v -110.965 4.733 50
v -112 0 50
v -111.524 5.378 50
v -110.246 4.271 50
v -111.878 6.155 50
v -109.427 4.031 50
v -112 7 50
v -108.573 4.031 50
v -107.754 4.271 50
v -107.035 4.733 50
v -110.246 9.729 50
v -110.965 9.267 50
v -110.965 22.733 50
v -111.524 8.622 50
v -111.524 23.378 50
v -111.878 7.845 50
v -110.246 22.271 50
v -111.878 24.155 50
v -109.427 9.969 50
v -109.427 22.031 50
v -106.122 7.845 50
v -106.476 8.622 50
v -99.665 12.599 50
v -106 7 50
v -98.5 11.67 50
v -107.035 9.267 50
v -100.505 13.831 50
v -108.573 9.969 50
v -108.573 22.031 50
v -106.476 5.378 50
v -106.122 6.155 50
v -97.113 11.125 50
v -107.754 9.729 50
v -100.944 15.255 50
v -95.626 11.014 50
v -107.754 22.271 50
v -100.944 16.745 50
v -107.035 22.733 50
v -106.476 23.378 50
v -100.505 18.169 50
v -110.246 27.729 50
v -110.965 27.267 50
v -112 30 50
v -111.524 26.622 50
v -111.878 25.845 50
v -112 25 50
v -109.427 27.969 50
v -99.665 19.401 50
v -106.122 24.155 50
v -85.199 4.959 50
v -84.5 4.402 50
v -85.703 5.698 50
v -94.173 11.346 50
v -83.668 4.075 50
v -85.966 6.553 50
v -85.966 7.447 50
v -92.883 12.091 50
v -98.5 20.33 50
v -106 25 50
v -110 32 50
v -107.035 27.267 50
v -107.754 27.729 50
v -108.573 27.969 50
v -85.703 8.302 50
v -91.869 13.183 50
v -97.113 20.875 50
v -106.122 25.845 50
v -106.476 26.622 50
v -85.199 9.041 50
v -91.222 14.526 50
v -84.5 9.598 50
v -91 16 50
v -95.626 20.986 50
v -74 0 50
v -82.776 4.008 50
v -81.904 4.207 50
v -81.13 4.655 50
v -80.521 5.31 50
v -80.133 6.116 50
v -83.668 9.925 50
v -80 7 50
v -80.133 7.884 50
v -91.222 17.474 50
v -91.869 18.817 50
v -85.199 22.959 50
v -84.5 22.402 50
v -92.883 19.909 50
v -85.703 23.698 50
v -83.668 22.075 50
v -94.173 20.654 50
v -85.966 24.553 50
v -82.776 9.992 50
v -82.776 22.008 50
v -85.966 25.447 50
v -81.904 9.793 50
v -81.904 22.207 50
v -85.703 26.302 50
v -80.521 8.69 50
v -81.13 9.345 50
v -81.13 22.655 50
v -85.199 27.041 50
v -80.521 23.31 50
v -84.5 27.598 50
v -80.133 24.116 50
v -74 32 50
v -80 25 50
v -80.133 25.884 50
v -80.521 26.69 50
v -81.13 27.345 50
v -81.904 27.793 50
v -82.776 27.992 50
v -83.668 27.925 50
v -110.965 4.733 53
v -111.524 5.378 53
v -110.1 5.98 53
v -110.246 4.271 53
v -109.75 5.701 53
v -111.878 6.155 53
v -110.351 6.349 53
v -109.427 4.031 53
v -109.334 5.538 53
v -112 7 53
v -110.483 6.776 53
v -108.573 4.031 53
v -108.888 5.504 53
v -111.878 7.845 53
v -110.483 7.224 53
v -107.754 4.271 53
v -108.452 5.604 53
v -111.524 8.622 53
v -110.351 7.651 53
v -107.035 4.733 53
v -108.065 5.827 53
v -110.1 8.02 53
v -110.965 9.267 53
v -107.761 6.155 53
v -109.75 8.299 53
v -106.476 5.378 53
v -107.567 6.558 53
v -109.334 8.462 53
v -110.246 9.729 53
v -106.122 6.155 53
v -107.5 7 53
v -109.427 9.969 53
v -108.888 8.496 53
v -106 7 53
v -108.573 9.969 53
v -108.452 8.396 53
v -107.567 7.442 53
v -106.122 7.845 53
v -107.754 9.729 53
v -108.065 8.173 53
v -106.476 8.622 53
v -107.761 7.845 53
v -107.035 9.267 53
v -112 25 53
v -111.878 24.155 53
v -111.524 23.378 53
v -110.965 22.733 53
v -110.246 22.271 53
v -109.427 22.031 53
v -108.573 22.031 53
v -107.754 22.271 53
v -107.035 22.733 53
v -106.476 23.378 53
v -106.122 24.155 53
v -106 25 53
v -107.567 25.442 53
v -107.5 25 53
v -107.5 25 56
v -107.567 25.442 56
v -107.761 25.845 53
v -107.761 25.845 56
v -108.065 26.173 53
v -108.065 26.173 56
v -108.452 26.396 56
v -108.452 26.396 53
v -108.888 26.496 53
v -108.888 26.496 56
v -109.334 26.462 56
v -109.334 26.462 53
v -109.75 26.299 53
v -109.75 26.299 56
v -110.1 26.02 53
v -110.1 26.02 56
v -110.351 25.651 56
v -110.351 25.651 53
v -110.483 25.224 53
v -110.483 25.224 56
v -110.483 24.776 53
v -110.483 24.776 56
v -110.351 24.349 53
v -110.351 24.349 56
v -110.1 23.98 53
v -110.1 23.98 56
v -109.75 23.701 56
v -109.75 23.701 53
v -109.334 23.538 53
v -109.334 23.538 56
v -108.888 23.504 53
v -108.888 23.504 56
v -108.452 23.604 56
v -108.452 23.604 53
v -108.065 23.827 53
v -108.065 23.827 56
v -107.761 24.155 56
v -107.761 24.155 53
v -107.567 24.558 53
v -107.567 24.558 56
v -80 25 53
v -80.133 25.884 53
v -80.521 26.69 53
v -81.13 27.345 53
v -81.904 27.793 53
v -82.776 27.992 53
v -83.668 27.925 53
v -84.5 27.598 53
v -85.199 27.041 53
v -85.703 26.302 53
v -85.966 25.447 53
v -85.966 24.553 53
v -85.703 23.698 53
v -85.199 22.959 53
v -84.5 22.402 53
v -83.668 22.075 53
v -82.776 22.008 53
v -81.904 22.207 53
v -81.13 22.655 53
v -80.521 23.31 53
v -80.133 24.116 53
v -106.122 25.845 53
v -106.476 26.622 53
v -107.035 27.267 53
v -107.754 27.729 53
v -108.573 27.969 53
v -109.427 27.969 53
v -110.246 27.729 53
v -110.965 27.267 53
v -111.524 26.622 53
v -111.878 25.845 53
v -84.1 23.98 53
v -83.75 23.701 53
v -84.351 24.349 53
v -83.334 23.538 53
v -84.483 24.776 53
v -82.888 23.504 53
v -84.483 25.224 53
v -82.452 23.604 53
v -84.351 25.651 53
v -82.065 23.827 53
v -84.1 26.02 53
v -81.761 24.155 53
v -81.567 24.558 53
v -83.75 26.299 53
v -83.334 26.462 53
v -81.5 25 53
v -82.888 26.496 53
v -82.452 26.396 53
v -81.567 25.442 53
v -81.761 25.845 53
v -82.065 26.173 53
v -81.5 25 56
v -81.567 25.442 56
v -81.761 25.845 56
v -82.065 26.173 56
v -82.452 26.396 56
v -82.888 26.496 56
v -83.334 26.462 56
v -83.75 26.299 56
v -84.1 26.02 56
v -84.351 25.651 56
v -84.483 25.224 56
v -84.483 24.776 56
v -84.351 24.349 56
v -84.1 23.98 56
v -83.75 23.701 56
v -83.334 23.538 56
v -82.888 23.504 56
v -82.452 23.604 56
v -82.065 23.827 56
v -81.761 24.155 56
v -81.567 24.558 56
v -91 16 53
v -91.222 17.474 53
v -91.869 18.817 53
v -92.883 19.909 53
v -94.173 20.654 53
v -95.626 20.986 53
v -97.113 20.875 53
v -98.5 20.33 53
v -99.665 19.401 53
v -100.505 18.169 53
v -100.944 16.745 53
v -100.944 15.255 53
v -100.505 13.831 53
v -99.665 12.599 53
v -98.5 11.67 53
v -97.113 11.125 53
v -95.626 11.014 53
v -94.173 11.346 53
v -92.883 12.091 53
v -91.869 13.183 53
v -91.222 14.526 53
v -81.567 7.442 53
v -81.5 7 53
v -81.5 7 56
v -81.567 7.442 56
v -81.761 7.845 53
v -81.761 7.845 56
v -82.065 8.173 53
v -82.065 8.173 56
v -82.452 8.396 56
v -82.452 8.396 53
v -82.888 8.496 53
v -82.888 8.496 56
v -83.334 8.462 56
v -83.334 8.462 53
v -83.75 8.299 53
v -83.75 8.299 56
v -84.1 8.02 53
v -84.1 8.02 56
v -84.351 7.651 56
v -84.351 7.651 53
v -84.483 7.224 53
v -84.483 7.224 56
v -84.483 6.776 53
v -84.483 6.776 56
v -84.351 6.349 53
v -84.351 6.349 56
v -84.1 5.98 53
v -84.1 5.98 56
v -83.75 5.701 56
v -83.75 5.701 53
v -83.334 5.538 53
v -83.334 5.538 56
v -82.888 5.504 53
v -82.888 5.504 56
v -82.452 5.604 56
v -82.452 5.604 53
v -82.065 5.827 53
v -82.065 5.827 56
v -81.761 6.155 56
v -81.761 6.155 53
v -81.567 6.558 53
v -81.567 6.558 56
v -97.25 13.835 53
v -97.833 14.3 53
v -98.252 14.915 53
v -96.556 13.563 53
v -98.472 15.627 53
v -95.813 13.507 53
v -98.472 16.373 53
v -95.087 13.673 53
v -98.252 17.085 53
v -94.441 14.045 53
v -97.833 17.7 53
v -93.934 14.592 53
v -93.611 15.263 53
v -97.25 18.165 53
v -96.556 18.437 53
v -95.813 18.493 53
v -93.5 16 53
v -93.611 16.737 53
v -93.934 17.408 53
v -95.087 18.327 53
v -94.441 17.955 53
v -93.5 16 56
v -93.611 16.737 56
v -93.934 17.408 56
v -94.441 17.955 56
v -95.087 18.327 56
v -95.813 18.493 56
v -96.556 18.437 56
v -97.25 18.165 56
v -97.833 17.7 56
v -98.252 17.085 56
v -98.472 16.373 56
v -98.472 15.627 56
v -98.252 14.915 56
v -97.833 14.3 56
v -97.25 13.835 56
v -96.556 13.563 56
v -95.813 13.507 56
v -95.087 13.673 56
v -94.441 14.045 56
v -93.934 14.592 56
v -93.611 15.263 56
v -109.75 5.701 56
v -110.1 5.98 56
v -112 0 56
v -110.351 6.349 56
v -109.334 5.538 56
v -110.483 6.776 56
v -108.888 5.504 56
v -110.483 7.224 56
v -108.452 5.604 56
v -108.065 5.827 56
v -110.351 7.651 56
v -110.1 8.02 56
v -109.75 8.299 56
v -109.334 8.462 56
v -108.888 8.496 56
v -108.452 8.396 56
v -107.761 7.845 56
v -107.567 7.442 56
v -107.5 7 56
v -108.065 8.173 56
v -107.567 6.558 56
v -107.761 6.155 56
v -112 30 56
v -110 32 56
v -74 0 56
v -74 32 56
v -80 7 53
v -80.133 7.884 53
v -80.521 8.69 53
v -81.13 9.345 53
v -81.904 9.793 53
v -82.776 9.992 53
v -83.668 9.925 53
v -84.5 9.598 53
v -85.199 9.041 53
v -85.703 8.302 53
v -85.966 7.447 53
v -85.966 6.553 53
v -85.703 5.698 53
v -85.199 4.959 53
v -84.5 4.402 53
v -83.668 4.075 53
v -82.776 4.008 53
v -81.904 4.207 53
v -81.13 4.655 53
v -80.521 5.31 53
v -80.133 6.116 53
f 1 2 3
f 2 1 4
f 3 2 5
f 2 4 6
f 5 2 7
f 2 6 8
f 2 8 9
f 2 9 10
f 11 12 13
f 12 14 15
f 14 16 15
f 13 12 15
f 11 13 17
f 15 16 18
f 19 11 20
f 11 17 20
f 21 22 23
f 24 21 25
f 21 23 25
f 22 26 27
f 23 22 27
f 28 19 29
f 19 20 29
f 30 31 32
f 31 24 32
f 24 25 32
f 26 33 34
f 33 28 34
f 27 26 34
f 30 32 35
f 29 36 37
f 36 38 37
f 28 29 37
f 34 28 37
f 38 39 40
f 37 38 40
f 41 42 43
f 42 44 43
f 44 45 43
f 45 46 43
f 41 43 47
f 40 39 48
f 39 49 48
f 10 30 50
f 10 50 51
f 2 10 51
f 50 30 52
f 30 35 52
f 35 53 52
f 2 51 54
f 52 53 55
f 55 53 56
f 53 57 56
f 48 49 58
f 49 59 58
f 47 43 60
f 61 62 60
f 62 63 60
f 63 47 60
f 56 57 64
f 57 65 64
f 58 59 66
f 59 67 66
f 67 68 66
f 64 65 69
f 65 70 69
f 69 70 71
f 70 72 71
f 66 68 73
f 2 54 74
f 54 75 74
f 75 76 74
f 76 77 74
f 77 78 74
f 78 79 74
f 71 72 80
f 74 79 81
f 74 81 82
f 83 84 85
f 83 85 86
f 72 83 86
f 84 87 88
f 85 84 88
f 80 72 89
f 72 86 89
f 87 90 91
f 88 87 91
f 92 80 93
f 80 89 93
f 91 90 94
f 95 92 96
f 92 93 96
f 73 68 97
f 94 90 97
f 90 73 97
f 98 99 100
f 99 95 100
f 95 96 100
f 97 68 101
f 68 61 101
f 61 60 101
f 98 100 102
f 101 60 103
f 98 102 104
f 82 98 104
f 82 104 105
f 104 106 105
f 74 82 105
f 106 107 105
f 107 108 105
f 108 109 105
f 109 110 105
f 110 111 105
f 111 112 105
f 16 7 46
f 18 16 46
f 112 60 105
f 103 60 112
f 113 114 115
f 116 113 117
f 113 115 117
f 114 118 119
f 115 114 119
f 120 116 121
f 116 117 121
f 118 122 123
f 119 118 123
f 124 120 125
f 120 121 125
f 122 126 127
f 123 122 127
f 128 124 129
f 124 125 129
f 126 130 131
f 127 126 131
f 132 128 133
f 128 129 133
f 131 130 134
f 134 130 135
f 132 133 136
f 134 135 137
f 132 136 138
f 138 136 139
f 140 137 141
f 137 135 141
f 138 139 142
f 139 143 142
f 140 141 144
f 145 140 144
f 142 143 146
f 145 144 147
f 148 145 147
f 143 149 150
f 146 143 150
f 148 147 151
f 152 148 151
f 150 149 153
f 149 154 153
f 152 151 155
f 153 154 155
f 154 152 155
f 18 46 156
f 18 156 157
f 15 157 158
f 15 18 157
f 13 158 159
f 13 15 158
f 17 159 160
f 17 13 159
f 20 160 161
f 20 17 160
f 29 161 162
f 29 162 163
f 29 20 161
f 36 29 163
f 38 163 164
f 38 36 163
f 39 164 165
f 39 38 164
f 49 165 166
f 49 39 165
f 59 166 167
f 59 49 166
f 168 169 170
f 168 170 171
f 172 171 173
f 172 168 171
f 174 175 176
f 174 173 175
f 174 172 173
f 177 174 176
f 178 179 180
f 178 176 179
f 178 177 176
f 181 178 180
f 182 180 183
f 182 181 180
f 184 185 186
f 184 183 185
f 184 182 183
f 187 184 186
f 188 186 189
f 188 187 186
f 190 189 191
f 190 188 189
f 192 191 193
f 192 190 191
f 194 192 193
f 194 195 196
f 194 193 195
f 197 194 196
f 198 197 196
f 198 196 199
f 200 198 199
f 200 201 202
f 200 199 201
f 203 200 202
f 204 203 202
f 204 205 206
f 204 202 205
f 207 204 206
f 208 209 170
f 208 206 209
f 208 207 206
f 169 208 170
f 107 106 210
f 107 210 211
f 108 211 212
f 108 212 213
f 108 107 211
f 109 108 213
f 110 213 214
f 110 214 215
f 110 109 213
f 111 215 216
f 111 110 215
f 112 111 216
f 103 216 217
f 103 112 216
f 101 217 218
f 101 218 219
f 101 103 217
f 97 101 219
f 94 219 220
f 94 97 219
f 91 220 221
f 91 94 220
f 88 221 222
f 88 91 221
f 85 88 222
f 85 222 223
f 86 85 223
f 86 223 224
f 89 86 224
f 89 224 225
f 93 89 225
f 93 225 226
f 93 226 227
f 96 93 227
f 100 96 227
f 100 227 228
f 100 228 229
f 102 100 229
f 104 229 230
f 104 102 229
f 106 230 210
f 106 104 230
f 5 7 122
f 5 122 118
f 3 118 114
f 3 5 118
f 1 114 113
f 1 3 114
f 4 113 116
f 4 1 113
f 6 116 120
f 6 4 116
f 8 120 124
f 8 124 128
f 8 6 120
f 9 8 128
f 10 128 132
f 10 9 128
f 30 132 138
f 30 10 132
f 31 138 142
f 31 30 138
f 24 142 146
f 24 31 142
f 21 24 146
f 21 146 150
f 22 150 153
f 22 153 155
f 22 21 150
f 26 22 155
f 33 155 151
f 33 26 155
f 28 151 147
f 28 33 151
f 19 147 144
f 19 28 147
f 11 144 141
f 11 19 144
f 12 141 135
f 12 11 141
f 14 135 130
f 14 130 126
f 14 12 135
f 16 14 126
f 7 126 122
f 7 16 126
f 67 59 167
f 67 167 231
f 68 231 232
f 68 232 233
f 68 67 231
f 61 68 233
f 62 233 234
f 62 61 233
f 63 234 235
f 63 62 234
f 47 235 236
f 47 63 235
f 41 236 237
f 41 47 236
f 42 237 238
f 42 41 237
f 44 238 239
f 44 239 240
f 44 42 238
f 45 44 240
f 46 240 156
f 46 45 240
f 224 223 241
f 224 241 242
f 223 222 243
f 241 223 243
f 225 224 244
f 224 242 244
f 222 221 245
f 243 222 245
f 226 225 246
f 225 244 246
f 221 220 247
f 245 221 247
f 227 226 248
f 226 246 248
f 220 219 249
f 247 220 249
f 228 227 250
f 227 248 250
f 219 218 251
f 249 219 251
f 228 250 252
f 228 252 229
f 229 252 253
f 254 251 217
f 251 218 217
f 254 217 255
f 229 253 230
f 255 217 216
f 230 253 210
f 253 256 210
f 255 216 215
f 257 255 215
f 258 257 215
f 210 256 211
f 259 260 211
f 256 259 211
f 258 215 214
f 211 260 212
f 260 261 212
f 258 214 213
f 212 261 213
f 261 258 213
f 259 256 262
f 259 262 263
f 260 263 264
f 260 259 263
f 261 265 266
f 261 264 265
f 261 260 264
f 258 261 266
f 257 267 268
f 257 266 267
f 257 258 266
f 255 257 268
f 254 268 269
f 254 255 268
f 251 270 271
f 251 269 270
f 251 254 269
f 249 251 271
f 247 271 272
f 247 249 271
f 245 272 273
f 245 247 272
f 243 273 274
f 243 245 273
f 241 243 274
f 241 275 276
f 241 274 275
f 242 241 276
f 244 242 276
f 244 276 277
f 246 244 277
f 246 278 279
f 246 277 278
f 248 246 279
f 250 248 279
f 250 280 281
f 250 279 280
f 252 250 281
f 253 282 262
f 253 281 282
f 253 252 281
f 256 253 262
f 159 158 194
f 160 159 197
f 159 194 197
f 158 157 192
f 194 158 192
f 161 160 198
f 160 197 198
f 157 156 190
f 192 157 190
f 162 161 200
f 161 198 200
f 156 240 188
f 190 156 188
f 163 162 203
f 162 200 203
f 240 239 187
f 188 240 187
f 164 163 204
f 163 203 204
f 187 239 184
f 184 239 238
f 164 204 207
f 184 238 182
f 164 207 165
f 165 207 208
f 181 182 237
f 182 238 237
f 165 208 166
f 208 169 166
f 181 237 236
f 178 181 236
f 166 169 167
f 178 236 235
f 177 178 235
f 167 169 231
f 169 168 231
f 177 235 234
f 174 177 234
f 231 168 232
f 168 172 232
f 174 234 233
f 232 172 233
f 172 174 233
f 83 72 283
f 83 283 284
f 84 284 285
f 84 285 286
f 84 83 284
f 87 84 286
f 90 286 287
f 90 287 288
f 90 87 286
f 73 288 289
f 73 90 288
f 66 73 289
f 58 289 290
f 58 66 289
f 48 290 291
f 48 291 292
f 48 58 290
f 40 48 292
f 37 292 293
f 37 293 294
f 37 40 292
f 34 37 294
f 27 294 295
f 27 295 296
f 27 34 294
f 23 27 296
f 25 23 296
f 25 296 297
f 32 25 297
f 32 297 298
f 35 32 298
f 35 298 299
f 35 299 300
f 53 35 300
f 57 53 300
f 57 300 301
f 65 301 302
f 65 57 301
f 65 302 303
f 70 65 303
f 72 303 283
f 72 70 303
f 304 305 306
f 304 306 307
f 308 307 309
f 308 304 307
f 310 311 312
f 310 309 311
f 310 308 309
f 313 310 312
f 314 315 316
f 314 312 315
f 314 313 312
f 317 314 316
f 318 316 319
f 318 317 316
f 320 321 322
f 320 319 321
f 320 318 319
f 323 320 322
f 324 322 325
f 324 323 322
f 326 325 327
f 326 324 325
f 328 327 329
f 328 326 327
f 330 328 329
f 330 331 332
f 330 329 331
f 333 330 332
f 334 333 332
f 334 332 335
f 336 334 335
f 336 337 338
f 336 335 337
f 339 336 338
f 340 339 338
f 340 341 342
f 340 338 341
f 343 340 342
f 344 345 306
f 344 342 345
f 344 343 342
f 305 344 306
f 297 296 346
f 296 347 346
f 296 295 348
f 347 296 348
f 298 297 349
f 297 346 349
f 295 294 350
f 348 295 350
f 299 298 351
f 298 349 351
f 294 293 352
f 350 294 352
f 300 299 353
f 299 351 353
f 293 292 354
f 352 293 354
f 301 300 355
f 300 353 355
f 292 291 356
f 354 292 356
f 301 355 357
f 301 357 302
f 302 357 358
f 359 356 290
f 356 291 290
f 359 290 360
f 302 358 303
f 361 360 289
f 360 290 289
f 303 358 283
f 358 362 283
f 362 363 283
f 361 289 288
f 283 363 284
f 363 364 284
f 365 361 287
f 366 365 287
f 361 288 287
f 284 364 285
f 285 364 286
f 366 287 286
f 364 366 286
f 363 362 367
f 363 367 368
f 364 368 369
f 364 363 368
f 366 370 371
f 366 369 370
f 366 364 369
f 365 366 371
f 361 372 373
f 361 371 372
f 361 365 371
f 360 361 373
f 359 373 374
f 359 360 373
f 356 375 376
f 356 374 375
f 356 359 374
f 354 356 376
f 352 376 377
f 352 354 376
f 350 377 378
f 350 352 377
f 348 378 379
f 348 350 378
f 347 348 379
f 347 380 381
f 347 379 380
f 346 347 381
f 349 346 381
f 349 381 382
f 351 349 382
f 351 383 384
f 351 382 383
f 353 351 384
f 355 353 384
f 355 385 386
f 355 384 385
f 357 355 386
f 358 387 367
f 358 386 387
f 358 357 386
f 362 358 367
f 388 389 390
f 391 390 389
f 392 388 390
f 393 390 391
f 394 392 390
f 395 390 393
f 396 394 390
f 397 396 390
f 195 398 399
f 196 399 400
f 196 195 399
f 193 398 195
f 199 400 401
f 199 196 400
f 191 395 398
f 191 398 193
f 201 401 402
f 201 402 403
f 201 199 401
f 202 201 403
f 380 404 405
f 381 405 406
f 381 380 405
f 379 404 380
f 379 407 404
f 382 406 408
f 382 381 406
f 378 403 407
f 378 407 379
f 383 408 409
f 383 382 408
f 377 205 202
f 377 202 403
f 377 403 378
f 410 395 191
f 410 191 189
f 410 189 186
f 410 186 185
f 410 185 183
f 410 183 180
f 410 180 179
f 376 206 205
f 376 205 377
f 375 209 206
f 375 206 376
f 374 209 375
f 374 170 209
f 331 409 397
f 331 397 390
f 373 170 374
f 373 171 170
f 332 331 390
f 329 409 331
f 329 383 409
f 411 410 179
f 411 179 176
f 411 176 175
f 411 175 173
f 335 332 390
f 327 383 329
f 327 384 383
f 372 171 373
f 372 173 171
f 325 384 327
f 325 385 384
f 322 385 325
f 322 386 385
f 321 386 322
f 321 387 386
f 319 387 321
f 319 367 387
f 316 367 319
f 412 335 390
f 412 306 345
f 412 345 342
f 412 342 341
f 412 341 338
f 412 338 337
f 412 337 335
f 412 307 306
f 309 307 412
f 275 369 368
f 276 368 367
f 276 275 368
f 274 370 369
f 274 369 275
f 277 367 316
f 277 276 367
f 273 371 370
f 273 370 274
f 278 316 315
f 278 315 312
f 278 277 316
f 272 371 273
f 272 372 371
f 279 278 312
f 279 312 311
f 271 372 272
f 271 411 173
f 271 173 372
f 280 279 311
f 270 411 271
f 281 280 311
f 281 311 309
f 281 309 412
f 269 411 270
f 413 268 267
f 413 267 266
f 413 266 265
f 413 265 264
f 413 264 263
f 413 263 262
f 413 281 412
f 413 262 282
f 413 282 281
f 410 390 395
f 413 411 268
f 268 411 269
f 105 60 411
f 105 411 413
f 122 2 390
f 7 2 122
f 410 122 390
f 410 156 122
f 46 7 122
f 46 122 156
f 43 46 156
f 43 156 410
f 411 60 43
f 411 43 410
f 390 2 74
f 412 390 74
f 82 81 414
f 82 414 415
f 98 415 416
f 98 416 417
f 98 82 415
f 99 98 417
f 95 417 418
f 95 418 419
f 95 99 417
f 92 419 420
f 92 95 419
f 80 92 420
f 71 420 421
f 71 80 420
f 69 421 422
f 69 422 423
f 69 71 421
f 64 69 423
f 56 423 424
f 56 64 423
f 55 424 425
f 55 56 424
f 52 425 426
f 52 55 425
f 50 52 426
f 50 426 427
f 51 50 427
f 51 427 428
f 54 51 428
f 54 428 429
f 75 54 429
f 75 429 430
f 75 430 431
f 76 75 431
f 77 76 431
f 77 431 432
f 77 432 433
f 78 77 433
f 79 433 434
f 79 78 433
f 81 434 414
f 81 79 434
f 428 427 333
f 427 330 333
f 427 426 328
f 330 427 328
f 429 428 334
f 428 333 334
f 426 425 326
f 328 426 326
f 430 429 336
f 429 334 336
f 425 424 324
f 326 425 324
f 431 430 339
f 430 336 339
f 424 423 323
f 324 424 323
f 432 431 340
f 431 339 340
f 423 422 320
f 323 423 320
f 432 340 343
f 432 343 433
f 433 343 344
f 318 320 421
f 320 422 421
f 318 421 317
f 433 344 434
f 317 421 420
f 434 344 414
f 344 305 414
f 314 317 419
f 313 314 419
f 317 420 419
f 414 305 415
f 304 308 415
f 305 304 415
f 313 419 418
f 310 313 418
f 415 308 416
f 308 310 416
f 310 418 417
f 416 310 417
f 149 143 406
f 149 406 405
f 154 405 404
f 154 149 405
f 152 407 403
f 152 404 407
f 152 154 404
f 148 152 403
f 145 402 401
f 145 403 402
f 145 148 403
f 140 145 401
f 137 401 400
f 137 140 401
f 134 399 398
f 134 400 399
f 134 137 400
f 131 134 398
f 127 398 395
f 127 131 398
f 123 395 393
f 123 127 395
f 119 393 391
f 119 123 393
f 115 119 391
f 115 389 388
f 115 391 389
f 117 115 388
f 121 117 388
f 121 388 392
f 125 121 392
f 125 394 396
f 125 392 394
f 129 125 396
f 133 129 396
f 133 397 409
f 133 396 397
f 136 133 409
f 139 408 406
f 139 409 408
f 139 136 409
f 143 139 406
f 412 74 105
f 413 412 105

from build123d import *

# Parameters (mm, degrees)
CYLINDER882_R     = 5
CYLINDER882_DEPTH = 3
CYLINDER891_R     = 2.5
CYLINDER891_DEPTH = 20
CYLINDER883_R     = 1.5
CYLINDER883_DEPTH = 20
CYLINDER885_R     = 1.5
CYLINDER885_DEPTH = 20
CYLINDER886_R     = 1.5
CYLINDER886_DEPTH = 20
CYLINDER884_R     = 1.5
CYLINDER884_DEPTH = 20
CYLINDER887_R     = 3
CYLINDER887_DEPTH = 3
CYLINDER888_R     = 3
CYLINDER888_DEPTH = 3
CYLINDER890_R     = 3
CYLINDER890_DEPTH = 3
CYLINDER889_R     = 3
CYLINDER889_DEPTH = 3
BOX422_W          = 38
BOX422_H          = 32
BOX422_DEPTH      = 6
CHAMFER001_SIZE   = 2


with BuildPart() as v_lec882:
    # Cylinder882 → Cylinder882 (new body)
    with BuildSketch(Plane(origin=(-96, 16, 50), x_dir=(1, 0, 0), z_dir=(0, 0, 1))):
        Circle(CYLINDER882_R)
    extrude(amount=CYLINDER882_DEPTH)


with BuildPart() as v_lec891:
    # Cylinder891 → Cylinder891 (new body)
    with BuildSketch(Plane(origin=(-96, 16, 50), x_dir=(1, 0, 0), z_dir=(0, 0, 1))):
        Circle(CYLINDER891_R)
    extrude(amount=CYLINDER891_DEPTH)


with BuildPart() as v_lec883:
    # Cylinder883 → Cylinder883 (new body)
    with BuildSketch(Plane(origin=(-83, 25, 54), x_dir=(1, 0, 0), z_dir=(0, 0, 1))):
        Circle(CYLINDER883_R)
    extrude(amount=CYLINDER883_DEPTH)


with BuildPart() as v_lec885:
    # Cylinder885 → Cylinder885 (new body)
    with BuildSketch(Plane(origin=(-109, 7, 54), x_dir=(1, 0, 0), z_dir=(0, 0, 1))):
        Circle(CYLINDER885_R)
    extrude(amount=CYLINDER885_DEPTH)


with BuildPart() as v_lec886:
    # Cylinder886 → Cylinder886 (new body)
    with BuildSketch(Plane(origin=(-109, 25, 54), x_dir=(1, 0, 0), z_dir=(0, 0, 1))):
        Circle(CYLINDER886_R)
    extrude(amount=CYLINDER886_DEPTH)


with BuildPart() as compound491:
    # Cylinder884 → Cylinder884 (new body)
    with BuildSketch(Plane(origin=(-83, 7, 54), x_dir=(1, 0, 0), z_dir=(0, 0, 1))):
        Circle(CYLINDER884_R)
    extrude(amount=CYLINDER884_DEPTH)

    # Compound491: union Válec883, Válec885, Válec886
    add(v_lec883.part)
    add(v_lec885.part)
    add(v_lec886.part)


with BuildPart() as compound491_1:
    # Compound491 placement: moved
    add(compound491.part.moved(Location((0, 0, -4))))


with BuildPart() as v_lec887:
    # Cylinder887 → Cylinder887 (new body)
    with BuildSketch(Plane(origin=(-83, 25, 54), x_dir=(1, 0, 0), z_dir=(0, 0, 1))):
        Circle(CYLINDER887_R)
    extrude(amount=CYLINDER887_DEPTH)


with BuildPart() as v_lec888:
    # Cylinder888 → Cylinder888 (new body)
    with BuildSketch(Plane(origin=(-109, 7, 54), x_dir=(1, 0, 0), z_dir=(0, 0, 1))):
        Circle(CYLINDER888_R)
    extrude(amount=CYLINDER888_DEPTH)


with BuildPart() as v_lec890:
    # Cylinder890 → Cylinder890 (new body)
    with BuildSketch(Plane(origin=(-109, 25, 54), x_dir=(1, 0, 0), z_dir=(0, 0, 1))):
        Circle(CYLINDER890_R)
    extrude(amount=CYLINDER890_DEPTH)


with BuildPart() as compound492:
    # Cylinder889 → Cylinder889 (new body)
    with BuildSketch(Plane(origin=(-83, 7, 54), x_dir=(1, 0, 0), z_dir=(0, 0, 1))):
        Circle(CYLINDER889_R)
    extrude(amount=CYLINDER889_DEPTH)

    # Compound492: union Válec887, Válec888, Válec890
    add(v_lec887.part)
    add(v_lec888.part)
    add(v_lec890.part)


with BuildPart() as compound492_1:
    # Compound492 placement: moved
    add(compound492.part.moved(Location((0, 0, -4))))


with BuildPart() as base_stabil_cover_left:
    # Box422 → Box422 (new body)
    with BuildSketch(Plane(origin=(-112, 0, 50), x_dir=(1, 0, 0), z_dir=(0, 0, 1))):
        with Locations((19, 16)):
            Rectangle(BOX422_W, BOX422_H)
    extrude(amount=BOX422_DEPTH)

    # Cut394: cut Compound492
    add(compound492_1.part, mode=Mode.SUBTRACT)

    # Cut395: cut Compound491
    add(compound491_1.part, mode=Mode.SUBTRACT)

    # Cut396: cut Válec891
    add(v_lec891.part, mode=Mode.SUBTRACT)

    # Cut397: cut Válec882
    add(v_lec882.part, mode=Mode.SUBTRACT)

    # Chamfer001
    chamfer001_edges = [base_stabil_cover_left.edges().sort_by_distance(p)[0] for p in [
        (-112, 32, 53),
    ]]
    chamfer(chamfer001_edges, length=CHAMFER001_SIZE)


solid = base_stabil_cover_left.part
